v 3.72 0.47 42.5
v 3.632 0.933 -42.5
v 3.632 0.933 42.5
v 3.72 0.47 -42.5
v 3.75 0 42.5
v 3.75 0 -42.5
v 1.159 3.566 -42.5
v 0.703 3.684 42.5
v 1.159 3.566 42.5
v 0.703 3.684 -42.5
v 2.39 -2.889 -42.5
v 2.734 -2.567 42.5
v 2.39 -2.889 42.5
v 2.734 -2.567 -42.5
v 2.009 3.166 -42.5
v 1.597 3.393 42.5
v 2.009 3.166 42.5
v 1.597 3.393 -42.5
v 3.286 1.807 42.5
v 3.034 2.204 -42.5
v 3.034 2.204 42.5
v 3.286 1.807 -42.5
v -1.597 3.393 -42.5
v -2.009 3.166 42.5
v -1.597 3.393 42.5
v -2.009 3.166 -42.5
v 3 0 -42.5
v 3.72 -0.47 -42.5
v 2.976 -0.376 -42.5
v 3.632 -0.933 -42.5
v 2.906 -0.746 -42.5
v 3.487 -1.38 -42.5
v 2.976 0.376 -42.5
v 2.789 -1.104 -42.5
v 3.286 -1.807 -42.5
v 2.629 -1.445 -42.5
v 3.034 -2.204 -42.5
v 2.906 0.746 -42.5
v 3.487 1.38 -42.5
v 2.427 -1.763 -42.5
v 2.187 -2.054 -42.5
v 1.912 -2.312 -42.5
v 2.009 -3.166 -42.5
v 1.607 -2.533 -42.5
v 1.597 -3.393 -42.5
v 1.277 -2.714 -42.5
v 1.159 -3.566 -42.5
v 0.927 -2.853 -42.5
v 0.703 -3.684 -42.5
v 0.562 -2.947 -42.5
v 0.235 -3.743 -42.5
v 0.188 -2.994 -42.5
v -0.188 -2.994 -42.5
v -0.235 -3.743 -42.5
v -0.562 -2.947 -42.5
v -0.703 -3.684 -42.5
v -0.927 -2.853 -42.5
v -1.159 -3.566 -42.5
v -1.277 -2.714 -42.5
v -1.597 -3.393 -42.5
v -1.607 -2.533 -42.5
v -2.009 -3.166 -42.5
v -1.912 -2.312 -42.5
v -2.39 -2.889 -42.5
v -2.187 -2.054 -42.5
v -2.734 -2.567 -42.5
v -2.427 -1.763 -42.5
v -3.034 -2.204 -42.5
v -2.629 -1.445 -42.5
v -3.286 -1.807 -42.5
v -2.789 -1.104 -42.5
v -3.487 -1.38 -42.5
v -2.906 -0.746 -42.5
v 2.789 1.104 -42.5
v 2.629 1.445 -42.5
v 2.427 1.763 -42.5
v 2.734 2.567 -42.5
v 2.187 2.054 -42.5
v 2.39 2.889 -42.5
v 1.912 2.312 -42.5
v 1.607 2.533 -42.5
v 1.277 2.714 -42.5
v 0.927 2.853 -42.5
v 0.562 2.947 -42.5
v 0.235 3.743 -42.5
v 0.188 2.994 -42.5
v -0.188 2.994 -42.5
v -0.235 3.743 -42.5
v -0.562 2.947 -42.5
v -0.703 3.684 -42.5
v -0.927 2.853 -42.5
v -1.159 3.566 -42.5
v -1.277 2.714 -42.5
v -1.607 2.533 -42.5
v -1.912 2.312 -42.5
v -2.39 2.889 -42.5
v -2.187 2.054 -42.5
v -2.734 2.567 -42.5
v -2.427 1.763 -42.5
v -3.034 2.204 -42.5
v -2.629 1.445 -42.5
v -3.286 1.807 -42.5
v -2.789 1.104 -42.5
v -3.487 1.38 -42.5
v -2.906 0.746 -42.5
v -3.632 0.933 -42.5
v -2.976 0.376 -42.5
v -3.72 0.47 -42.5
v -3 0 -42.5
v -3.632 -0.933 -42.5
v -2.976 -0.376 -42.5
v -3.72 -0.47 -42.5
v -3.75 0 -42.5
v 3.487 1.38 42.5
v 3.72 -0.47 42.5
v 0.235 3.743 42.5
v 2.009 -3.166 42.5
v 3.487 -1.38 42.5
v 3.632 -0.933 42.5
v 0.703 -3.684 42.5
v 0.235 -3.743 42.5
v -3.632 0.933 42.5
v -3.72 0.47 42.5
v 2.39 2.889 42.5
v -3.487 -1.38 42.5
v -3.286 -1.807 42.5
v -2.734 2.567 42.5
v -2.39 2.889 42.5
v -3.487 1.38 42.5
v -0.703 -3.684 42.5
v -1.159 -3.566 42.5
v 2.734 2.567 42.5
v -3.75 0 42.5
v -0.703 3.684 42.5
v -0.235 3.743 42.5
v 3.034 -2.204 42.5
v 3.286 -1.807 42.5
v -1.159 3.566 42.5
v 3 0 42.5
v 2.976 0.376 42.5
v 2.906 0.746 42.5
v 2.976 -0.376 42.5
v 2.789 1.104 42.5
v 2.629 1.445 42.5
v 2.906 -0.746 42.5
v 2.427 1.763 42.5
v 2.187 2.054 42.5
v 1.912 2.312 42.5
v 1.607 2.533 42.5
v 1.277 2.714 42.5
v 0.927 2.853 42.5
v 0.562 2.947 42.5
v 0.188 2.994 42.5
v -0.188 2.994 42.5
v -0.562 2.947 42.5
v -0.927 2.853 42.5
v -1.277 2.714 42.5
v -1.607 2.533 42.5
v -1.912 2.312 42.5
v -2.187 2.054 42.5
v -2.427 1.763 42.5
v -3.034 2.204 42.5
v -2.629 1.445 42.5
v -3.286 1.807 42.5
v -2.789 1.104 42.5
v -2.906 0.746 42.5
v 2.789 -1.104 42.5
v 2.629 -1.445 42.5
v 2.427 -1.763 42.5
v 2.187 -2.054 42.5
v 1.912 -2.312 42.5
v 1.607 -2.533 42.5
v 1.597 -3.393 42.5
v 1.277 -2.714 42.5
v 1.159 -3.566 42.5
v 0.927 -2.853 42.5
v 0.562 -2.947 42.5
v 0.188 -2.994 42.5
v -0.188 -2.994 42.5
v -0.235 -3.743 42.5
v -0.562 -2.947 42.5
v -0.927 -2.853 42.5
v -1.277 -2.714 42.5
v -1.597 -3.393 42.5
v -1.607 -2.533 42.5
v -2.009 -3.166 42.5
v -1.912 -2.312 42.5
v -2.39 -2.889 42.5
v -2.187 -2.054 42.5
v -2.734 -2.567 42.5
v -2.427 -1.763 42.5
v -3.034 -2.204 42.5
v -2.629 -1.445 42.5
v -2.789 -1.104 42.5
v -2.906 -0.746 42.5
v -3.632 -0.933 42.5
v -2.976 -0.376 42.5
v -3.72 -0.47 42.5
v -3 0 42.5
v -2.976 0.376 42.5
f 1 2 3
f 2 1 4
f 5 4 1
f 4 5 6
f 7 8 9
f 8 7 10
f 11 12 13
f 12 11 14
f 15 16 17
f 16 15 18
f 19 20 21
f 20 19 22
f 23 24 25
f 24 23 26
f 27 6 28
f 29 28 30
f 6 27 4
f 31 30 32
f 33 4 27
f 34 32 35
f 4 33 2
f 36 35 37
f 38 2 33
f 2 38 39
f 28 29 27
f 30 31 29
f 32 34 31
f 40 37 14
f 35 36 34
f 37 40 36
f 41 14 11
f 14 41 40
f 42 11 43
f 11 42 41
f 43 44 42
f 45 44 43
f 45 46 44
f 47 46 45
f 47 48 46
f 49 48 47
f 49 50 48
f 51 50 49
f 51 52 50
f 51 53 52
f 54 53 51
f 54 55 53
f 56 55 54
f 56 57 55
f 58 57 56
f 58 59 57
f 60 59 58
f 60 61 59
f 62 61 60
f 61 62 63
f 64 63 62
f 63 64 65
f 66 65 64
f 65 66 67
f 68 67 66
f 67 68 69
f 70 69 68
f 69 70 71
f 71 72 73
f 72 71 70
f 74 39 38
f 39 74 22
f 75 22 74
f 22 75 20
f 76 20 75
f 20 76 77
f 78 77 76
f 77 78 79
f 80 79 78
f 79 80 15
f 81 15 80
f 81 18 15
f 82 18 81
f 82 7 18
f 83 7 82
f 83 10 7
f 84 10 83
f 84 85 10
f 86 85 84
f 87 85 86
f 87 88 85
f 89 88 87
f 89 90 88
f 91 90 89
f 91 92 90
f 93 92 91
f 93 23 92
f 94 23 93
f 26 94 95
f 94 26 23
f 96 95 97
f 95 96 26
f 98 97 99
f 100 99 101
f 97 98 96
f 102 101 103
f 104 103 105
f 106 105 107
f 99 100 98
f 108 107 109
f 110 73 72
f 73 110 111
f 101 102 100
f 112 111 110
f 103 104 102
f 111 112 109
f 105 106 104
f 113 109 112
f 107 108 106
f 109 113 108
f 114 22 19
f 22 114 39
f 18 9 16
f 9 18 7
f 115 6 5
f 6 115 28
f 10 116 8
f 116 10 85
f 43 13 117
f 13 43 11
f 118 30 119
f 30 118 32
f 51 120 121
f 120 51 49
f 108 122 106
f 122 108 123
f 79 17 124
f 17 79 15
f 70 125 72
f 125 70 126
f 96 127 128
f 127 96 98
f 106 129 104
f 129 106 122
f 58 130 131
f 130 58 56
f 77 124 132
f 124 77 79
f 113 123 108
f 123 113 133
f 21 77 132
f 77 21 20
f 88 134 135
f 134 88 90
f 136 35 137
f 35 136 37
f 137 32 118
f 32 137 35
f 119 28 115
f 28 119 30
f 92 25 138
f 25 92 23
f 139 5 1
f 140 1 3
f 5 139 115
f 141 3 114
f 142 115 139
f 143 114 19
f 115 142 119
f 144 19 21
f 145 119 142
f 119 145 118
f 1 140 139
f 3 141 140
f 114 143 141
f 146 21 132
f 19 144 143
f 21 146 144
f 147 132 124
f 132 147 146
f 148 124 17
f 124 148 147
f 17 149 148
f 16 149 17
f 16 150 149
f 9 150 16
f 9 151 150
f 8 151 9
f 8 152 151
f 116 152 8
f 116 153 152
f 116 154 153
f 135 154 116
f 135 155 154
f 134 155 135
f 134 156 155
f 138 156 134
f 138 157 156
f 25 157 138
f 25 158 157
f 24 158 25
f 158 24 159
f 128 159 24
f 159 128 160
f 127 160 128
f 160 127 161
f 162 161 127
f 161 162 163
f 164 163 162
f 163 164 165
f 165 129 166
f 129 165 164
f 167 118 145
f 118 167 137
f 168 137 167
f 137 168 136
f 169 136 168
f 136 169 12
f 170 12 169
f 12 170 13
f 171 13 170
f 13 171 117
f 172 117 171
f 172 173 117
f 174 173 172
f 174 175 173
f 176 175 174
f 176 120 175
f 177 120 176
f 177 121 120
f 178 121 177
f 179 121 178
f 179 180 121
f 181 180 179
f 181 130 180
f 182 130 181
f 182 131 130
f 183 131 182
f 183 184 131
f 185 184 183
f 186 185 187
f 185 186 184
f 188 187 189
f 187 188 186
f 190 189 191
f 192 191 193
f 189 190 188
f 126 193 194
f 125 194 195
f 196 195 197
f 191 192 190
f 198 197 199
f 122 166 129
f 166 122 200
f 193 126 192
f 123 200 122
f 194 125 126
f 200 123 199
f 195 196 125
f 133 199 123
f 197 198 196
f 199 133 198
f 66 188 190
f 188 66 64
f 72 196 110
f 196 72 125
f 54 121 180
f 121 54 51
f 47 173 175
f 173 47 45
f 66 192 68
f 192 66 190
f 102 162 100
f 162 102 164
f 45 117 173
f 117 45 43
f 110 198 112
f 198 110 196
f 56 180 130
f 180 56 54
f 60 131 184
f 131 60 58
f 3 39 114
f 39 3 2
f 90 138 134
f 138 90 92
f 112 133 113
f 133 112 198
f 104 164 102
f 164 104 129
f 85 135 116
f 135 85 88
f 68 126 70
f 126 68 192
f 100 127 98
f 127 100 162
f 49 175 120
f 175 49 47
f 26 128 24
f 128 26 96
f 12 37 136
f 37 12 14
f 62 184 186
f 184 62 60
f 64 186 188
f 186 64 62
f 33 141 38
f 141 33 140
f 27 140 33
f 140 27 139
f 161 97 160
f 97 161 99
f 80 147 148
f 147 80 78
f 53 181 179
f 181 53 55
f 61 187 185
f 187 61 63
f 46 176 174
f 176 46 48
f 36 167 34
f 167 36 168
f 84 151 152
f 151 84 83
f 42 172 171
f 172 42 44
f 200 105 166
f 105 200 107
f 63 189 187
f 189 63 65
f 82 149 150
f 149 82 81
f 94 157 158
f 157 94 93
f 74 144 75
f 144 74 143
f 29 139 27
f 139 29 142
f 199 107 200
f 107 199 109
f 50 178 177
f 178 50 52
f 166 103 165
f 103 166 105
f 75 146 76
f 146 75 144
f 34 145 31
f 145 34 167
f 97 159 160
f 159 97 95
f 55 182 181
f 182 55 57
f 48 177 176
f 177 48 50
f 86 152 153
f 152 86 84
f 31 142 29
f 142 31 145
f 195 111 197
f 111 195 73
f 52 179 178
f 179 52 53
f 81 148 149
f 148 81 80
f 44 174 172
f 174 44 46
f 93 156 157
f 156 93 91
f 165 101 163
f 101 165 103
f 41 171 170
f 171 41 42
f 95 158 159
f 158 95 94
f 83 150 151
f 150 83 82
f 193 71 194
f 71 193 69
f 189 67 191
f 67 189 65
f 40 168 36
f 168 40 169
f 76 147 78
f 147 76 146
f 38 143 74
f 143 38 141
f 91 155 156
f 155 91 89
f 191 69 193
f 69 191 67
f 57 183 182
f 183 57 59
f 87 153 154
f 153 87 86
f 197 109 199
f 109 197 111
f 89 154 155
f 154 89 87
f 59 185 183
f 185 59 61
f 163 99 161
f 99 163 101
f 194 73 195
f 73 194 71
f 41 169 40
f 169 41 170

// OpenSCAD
$fn = 50;


difference() {
	union() {
		translate(v = [0, 0, -42.5000000000]) {
			cylinder(h = 85, r = 3.7500000000);
		}
	}
	union() {
		translate(v = [0, 0, -100.0000000000]) {
			cylinder(h = 200, r = 3.0000000000);
		}
	}
}
